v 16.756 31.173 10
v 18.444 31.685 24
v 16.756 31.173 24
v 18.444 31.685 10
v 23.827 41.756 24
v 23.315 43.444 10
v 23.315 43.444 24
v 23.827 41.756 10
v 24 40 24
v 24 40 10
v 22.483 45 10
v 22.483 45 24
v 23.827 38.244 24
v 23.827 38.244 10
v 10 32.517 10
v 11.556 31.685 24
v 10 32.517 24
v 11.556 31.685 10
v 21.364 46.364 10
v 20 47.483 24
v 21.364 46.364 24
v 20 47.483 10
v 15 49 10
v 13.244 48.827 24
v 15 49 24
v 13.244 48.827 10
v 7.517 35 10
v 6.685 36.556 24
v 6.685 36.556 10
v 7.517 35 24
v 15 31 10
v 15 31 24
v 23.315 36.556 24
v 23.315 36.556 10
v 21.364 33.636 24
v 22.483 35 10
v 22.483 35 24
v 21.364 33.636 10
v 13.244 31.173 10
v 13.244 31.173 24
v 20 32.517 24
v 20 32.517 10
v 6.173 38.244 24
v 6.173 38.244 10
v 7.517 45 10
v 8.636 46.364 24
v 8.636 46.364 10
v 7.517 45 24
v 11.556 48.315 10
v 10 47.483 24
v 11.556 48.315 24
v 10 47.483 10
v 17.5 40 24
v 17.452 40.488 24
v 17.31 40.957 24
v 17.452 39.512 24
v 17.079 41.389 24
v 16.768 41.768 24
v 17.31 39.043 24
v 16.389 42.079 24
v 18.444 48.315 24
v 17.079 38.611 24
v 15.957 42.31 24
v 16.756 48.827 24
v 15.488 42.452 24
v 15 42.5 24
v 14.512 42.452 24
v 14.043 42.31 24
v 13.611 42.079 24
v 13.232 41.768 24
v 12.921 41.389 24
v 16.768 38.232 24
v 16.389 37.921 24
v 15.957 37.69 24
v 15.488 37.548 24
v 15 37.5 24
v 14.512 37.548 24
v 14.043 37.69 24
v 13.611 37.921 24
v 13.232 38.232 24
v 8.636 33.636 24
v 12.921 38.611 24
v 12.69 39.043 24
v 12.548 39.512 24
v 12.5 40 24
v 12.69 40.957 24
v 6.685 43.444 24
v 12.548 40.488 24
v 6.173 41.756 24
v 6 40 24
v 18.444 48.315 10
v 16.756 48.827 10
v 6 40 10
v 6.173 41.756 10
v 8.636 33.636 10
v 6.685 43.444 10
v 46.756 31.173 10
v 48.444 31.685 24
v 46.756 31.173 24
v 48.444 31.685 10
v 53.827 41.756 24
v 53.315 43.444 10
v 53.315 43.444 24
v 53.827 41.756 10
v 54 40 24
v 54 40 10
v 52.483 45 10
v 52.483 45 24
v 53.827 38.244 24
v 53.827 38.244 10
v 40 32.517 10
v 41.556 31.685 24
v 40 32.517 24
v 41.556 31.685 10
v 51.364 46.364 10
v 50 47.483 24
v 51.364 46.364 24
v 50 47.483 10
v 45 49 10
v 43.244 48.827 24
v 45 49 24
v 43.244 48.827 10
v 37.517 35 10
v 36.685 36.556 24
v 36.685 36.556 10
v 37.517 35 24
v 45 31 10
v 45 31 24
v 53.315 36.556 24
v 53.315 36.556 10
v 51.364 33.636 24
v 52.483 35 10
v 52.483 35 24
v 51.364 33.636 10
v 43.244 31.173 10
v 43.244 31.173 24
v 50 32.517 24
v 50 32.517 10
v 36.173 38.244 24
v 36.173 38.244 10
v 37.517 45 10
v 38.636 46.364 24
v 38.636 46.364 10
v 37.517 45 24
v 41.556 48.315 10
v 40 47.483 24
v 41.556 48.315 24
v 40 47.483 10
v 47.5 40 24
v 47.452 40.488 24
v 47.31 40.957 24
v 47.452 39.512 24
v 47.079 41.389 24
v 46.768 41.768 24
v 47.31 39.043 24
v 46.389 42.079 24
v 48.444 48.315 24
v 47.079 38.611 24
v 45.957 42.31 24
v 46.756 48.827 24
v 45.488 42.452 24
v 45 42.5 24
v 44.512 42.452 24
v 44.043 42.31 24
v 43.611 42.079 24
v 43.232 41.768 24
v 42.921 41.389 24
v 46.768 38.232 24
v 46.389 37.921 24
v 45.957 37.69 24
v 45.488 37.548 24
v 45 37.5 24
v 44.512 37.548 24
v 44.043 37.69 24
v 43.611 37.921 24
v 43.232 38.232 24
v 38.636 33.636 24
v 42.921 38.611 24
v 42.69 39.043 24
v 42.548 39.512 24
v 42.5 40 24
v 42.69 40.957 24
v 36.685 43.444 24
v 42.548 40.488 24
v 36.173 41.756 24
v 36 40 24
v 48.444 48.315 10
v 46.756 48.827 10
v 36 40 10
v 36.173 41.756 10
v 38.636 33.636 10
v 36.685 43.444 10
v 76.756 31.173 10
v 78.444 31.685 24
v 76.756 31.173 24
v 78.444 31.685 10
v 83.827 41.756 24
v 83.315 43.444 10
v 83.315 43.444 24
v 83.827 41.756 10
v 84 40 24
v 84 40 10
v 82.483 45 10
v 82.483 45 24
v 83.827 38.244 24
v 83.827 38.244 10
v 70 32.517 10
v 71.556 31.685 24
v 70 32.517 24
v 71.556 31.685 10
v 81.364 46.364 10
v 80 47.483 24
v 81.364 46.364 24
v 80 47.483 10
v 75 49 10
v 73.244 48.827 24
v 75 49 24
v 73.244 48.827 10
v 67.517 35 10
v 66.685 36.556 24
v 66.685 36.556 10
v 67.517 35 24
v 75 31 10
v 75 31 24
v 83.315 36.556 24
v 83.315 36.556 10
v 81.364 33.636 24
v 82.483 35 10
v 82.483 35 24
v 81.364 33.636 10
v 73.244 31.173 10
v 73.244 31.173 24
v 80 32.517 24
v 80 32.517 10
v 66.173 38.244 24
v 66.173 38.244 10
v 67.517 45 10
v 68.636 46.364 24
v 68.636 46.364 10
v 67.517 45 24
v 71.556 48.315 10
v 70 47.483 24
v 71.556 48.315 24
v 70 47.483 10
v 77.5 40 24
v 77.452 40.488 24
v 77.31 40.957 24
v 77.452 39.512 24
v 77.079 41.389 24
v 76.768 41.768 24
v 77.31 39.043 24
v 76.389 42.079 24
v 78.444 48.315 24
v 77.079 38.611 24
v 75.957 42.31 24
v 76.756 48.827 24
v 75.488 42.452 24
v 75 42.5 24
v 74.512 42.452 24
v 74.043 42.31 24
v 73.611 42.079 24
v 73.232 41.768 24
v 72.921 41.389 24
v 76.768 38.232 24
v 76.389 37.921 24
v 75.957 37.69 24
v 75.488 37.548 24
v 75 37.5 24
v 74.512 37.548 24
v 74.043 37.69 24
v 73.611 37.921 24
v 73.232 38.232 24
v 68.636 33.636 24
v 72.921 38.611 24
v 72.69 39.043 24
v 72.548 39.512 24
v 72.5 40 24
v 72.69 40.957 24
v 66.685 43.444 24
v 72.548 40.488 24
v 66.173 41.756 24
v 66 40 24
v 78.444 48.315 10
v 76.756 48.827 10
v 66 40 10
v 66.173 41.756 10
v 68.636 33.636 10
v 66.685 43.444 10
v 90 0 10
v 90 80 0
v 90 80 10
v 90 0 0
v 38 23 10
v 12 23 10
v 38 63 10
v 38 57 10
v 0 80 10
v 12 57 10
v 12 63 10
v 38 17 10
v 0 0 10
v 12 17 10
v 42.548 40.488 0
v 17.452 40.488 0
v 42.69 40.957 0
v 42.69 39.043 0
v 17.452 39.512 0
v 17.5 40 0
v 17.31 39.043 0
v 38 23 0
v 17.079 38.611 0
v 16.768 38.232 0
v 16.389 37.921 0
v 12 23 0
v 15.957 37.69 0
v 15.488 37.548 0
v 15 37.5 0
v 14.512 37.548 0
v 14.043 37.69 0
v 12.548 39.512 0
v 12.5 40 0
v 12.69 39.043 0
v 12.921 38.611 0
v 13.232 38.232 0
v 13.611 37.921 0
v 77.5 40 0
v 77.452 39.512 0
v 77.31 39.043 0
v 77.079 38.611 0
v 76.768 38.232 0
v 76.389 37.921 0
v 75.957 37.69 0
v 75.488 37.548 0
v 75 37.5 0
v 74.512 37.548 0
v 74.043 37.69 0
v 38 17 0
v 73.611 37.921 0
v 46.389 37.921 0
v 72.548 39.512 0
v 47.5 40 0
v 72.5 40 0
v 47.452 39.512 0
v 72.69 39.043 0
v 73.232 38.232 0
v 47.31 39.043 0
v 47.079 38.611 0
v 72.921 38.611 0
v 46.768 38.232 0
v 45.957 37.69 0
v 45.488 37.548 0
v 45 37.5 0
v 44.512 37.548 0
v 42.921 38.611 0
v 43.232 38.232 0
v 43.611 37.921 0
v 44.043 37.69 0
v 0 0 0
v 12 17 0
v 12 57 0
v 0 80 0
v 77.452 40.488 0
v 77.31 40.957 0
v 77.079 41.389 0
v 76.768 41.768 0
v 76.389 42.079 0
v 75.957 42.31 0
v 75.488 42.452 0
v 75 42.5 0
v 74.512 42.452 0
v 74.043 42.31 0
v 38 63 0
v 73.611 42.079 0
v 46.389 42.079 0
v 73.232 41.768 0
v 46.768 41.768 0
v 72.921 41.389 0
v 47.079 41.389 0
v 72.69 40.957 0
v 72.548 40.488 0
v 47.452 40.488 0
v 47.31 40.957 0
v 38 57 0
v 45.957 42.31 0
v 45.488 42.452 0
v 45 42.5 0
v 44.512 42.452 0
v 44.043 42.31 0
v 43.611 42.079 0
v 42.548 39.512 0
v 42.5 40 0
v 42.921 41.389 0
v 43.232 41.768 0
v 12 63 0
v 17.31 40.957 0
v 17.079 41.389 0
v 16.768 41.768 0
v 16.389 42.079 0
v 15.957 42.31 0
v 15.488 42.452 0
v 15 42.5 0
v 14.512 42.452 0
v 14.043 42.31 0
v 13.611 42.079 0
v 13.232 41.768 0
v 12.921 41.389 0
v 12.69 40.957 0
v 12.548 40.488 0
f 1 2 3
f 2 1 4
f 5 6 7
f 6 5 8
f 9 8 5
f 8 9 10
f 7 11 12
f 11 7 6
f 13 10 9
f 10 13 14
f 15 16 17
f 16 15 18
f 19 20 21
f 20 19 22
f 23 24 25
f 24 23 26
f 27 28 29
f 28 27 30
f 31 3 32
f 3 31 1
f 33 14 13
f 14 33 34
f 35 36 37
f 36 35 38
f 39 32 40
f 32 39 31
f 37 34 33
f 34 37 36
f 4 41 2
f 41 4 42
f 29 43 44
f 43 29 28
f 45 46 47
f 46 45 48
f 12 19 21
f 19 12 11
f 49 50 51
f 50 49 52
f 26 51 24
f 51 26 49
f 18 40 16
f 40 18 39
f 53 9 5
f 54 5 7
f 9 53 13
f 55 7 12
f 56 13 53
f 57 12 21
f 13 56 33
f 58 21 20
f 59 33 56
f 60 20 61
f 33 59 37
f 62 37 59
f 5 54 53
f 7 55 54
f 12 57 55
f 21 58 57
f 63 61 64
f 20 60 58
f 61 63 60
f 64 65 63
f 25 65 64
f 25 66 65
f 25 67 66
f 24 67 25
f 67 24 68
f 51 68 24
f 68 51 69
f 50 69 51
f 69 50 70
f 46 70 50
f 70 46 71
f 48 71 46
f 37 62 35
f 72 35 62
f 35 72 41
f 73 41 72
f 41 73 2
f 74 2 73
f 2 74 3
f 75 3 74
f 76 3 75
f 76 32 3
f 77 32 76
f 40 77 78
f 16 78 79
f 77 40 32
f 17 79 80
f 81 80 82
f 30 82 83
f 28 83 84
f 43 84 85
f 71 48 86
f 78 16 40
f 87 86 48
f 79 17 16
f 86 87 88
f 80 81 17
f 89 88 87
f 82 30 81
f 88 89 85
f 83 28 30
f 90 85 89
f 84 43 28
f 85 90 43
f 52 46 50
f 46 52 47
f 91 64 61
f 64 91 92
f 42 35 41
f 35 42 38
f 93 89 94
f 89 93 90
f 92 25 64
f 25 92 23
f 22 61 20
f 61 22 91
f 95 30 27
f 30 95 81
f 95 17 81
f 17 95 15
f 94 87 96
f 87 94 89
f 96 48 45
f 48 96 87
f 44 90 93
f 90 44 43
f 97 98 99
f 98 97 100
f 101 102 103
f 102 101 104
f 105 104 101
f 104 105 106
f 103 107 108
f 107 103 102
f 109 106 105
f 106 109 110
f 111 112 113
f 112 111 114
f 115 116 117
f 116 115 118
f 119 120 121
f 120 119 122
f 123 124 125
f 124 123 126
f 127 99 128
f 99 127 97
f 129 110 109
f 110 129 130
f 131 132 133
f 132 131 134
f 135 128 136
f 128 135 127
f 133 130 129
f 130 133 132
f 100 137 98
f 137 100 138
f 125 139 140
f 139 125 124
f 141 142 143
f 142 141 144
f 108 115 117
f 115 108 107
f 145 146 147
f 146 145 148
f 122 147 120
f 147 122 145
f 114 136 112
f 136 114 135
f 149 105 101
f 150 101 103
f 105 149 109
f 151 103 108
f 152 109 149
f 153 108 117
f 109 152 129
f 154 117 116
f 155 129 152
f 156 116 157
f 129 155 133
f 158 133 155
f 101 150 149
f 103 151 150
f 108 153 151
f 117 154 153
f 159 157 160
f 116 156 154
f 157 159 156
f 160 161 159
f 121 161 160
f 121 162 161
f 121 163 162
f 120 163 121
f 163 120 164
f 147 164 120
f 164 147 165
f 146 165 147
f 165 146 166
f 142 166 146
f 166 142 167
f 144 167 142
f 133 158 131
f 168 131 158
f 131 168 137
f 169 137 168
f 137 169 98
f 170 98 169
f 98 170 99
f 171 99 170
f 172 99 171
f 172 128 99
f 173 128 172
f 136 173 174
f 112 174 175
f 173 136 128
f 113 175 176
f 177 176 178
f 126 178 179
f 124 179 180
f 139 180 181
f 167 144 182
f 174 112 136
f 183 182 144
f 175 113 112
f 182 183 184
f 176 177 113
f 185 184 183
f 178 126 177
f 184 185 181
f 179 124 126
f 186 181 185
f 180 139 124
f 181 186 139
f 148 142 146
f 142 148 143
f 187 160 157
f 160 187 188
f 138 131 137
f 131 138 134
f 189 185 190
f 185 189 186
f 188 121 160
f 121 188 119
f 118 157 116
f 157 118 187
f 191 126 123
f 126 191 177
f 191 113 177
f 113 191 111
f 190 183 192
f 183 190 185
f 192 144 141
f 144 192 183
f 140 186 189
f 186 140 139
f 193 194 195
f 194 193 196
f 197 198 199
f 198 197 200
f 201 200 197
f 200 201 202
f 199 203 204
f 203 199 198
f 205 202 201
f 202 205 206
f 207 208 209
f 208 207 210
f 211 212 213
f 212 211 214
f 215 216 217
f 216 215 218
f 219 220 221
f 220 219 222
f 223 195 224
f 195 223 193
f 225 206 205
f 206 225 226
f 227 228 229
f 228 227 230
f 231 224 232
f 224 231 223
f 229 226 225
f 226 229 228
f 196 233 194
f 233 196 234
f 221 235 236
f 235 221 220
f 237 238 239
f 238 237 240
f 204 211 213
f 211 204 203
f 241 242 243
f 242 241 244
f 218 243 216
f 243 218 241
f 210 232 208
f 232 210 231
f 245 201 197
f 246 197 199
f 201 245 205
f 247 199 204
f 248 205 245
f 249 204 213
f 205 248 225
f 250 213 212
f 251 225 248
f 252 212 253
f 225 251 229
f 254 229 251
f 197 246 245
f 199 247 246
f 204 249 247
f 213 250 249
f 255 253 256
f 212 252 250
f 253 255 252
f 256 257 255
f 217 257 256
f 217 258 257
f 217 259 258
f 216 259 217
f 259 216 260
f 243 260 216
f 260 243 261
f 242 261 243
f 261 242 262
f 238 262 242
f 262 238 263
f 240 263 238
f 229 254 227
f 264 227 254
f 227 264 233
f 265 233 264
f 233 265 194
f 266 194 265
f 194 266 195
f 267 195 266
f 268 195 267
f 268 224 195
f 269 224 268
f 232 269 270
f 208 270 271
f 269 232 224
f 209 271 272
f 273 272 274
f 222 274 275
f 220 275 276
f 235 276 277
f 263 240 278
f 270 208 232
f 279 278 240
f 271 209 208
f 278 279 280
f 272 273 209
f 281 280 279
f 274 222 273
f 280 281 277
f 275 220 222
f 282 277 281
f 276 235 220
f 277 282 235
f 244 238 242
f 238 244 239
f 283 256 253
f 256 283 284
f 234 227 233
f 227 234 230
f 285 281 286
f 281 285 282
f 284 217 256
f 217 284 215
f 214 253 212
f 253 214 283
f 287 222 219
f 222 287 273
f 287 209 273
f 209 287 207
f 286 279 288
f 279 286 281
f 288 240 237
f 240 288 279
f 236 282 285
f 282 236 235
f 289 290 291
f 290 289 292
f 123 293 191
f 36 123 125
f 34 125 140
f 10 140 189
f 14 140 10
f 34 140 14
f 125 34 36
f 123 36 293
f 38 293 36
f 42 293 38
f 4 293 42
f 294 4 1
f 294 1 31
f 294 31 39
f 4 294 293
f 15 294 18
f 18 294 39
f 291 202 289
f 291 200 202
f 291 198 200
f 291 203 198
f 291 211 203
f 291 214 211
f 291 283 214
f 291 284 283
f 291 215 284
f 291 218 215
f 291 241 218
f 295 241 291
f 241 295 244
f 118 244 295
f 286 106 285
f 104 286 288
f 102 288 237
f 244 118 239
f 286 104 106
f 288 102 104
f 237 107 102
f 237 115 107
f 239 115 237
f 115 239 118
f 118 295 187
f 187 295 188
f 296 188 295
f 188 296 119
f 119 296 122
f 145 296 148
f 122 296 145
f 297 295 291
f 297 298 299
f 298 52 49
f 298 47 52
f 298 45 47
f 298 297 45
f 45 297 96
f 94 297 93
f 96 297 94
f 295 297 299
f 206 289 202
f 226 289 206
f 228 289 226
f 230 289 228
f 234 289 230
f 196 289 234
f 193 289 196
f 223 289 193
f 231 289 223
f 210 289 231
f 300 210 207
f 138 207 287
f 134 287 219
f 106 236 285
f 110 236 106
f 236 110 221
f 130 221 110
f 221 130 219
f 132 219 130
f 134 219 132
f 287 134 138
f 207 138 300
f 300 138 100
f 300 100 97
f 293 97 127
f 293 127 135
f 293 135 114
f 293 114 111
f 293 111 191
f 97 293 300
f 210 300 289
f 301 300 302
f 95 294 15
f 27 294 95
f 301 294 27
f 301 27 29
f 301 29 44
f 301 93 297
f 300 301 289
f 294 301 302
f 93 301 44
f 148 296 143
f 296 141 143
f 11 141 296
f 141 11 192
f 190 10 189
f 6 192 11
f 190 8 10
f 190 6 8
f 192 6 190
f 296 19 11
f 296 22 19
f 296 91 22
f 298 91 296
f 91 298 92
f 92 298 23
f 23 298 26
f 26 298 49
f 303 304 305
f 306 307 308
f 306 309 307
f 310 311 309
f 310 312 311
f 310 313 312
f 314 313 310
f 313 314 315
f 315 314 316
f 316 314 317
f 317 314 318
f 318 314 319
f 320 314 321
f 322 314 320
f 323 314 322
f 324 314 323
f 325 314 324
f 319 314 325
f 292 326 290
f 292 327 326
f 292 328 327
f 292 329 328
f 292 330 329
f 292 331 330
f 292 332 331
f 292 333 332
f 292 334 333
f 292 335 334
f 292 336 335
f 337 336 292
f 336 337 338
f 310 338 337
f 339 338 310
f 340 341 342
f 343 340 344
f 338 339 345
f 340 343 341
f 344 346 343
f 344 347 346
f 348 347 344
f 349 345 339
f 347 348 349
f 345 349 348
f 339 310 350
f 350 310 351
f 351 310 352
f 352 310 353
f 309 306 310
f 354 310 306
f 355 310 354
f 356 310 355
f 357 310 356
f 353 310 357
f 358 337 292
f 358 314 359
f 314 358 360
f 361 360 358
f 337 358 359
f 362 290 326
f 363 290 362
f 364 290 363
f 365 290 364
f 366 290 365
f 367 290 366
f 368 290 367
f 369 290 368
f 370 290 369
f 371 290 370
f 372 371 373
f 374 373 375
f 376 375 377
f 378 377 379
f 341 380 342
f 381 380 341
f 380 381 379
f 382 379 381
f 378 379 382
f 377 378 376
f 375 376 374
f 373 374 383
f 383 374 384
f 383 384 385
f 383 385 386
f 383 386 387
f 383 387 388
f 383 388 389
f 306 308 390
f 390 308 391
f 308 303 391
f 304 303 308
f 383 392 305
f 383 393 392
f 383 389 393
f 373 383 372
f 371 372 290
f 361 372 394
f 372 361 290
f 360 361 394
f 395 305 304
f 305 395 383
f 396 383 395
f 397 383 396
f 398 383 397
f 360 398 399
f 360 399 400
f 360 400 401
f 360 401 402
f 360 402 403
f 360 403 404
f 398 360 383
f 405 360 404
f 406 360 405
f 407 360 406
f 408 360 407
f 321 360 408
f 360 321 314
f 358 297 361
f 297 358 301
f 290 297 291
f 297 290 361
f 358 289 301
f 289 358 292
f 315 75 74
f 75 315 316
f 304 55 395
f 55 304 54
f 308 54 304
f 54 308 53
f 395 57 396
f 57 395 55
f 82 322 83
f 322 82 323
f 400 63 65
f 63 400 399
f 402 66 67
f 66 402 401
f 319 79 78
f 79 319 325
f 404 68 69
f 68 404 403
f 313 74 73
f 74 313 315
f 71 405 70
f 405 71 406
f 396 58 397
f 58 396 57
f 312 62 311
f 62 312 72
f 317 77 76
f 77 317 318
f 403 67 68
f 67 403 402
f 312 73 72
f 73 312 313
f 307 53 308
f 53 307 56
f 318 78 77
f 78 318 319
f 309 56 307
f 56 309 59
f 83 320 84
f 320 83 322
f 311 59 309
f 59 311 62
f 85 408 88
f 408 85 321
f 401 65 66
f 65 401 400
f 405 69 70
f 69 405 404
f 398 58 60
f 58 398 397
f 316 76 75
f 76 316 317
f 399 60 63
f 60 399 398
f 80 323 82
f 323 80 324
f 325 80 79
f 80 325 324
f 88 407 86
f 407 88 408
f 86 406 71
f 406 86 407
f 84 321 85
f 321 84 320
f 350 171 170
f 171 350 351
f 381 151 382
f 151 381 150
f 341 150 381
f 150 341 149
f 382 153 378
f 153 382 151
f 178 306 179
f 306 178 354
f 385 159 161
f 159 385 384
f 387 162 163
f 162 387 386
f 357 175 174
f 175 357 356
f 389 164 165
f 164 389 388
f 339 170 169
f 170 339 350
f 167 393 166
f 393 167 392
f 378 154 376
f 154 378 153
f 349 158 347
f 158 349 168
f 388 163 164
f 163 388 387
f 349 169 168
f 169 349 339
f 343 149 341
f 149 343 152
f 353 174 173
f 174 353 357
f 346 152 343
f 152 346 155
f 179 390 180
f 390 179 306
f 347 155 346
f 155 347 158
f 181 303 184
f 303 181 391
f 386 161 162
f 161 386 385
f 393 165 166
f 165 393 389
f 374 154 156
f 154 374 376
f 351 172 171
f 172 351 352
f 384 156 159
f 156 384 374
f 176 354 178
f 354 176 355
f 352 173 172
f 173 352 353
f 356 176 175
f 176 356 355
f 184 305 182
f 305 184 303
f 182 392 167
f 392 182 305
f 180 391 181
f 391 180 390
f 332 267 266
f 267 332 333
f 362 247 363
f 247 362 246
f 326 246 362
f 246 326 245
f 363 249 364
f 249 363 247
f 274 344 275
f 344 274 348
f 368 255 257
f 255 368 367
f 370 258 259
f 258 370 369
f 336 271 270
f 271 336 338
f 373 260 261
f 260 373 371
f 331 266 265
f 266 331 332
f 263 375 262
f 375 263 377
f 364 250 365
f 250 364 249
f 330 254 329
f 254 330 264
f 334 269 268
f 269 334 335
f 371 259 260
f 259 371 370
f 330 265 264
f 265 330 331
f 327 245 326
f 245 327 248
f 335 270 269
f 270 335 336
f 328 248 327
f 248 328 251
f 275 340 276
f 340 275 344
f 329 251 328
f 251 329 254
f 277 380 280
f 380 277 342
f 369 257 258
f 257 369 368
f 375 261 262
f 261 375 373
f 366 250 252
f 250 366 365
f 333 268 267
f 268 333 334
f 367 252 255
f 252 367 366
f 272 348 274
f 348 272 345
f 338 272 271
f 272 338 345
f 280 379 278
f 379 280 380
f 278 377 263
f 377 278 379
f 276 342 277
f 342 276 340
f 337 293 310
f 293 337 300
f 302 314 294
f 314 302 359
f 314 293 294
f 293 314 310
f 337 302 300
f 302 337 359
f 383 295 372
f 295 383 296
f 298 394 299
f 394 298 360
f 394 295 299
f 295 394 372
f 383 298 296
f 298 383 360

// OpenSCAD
$fn = 32;

// ----------------------------------------------------------------------
// Drill jig: three_boss_slot jig
// ----------------------------------------------------------------------

// --- parameters (mm) ---
plate_l = 90;             // plate length, X
plate_w = 80;             // plate width, Y
plate_t = 10;             // plate thickness
boss_d = 18;              // guide boss diameter
boss_h = 15;              // boss height above the plate
guide_d = 5;              // guide hole diameter
boss_pitch = 30;          // boss pitch
slot_w = 6;               // clamp slot width
slot_l = 26;              // clamp slot length
slot_x = 12;              // slot start X

n_boss = 3;  // guide bosses
boss_x0 = (plate_l - (n_boss - 1) * boss_pitch) / 2;  // first boss X
boss_top = plate_t - 1 + boss_h;  // boss crown height
total_h = boss_top;  // overall height

difference() {
  union() {
  cube([plate_l, plate_w, plate_t]);
  for (i = [0 : n_boss - 1])
    translate([boss_x0 + i * boss_pitch, plate_w / 2, plate_t - 1])
      cylinder(h = boss_h, d = boss_d);
  }
  for (i = [0 : n_boss - 1])
    translate([boss_x0 + i * boss_pitch, plate_w / 2, -1])
      cylinder(h = plate_t + boss_h, d = guide_d);
  for (cy = [plate_w * 0.25, plate_w * 0.75])
    translate([slot_x, cy - slot_w / 2, -1])
      cube([slot_l, slot_w, plate_t + 2]);
}
